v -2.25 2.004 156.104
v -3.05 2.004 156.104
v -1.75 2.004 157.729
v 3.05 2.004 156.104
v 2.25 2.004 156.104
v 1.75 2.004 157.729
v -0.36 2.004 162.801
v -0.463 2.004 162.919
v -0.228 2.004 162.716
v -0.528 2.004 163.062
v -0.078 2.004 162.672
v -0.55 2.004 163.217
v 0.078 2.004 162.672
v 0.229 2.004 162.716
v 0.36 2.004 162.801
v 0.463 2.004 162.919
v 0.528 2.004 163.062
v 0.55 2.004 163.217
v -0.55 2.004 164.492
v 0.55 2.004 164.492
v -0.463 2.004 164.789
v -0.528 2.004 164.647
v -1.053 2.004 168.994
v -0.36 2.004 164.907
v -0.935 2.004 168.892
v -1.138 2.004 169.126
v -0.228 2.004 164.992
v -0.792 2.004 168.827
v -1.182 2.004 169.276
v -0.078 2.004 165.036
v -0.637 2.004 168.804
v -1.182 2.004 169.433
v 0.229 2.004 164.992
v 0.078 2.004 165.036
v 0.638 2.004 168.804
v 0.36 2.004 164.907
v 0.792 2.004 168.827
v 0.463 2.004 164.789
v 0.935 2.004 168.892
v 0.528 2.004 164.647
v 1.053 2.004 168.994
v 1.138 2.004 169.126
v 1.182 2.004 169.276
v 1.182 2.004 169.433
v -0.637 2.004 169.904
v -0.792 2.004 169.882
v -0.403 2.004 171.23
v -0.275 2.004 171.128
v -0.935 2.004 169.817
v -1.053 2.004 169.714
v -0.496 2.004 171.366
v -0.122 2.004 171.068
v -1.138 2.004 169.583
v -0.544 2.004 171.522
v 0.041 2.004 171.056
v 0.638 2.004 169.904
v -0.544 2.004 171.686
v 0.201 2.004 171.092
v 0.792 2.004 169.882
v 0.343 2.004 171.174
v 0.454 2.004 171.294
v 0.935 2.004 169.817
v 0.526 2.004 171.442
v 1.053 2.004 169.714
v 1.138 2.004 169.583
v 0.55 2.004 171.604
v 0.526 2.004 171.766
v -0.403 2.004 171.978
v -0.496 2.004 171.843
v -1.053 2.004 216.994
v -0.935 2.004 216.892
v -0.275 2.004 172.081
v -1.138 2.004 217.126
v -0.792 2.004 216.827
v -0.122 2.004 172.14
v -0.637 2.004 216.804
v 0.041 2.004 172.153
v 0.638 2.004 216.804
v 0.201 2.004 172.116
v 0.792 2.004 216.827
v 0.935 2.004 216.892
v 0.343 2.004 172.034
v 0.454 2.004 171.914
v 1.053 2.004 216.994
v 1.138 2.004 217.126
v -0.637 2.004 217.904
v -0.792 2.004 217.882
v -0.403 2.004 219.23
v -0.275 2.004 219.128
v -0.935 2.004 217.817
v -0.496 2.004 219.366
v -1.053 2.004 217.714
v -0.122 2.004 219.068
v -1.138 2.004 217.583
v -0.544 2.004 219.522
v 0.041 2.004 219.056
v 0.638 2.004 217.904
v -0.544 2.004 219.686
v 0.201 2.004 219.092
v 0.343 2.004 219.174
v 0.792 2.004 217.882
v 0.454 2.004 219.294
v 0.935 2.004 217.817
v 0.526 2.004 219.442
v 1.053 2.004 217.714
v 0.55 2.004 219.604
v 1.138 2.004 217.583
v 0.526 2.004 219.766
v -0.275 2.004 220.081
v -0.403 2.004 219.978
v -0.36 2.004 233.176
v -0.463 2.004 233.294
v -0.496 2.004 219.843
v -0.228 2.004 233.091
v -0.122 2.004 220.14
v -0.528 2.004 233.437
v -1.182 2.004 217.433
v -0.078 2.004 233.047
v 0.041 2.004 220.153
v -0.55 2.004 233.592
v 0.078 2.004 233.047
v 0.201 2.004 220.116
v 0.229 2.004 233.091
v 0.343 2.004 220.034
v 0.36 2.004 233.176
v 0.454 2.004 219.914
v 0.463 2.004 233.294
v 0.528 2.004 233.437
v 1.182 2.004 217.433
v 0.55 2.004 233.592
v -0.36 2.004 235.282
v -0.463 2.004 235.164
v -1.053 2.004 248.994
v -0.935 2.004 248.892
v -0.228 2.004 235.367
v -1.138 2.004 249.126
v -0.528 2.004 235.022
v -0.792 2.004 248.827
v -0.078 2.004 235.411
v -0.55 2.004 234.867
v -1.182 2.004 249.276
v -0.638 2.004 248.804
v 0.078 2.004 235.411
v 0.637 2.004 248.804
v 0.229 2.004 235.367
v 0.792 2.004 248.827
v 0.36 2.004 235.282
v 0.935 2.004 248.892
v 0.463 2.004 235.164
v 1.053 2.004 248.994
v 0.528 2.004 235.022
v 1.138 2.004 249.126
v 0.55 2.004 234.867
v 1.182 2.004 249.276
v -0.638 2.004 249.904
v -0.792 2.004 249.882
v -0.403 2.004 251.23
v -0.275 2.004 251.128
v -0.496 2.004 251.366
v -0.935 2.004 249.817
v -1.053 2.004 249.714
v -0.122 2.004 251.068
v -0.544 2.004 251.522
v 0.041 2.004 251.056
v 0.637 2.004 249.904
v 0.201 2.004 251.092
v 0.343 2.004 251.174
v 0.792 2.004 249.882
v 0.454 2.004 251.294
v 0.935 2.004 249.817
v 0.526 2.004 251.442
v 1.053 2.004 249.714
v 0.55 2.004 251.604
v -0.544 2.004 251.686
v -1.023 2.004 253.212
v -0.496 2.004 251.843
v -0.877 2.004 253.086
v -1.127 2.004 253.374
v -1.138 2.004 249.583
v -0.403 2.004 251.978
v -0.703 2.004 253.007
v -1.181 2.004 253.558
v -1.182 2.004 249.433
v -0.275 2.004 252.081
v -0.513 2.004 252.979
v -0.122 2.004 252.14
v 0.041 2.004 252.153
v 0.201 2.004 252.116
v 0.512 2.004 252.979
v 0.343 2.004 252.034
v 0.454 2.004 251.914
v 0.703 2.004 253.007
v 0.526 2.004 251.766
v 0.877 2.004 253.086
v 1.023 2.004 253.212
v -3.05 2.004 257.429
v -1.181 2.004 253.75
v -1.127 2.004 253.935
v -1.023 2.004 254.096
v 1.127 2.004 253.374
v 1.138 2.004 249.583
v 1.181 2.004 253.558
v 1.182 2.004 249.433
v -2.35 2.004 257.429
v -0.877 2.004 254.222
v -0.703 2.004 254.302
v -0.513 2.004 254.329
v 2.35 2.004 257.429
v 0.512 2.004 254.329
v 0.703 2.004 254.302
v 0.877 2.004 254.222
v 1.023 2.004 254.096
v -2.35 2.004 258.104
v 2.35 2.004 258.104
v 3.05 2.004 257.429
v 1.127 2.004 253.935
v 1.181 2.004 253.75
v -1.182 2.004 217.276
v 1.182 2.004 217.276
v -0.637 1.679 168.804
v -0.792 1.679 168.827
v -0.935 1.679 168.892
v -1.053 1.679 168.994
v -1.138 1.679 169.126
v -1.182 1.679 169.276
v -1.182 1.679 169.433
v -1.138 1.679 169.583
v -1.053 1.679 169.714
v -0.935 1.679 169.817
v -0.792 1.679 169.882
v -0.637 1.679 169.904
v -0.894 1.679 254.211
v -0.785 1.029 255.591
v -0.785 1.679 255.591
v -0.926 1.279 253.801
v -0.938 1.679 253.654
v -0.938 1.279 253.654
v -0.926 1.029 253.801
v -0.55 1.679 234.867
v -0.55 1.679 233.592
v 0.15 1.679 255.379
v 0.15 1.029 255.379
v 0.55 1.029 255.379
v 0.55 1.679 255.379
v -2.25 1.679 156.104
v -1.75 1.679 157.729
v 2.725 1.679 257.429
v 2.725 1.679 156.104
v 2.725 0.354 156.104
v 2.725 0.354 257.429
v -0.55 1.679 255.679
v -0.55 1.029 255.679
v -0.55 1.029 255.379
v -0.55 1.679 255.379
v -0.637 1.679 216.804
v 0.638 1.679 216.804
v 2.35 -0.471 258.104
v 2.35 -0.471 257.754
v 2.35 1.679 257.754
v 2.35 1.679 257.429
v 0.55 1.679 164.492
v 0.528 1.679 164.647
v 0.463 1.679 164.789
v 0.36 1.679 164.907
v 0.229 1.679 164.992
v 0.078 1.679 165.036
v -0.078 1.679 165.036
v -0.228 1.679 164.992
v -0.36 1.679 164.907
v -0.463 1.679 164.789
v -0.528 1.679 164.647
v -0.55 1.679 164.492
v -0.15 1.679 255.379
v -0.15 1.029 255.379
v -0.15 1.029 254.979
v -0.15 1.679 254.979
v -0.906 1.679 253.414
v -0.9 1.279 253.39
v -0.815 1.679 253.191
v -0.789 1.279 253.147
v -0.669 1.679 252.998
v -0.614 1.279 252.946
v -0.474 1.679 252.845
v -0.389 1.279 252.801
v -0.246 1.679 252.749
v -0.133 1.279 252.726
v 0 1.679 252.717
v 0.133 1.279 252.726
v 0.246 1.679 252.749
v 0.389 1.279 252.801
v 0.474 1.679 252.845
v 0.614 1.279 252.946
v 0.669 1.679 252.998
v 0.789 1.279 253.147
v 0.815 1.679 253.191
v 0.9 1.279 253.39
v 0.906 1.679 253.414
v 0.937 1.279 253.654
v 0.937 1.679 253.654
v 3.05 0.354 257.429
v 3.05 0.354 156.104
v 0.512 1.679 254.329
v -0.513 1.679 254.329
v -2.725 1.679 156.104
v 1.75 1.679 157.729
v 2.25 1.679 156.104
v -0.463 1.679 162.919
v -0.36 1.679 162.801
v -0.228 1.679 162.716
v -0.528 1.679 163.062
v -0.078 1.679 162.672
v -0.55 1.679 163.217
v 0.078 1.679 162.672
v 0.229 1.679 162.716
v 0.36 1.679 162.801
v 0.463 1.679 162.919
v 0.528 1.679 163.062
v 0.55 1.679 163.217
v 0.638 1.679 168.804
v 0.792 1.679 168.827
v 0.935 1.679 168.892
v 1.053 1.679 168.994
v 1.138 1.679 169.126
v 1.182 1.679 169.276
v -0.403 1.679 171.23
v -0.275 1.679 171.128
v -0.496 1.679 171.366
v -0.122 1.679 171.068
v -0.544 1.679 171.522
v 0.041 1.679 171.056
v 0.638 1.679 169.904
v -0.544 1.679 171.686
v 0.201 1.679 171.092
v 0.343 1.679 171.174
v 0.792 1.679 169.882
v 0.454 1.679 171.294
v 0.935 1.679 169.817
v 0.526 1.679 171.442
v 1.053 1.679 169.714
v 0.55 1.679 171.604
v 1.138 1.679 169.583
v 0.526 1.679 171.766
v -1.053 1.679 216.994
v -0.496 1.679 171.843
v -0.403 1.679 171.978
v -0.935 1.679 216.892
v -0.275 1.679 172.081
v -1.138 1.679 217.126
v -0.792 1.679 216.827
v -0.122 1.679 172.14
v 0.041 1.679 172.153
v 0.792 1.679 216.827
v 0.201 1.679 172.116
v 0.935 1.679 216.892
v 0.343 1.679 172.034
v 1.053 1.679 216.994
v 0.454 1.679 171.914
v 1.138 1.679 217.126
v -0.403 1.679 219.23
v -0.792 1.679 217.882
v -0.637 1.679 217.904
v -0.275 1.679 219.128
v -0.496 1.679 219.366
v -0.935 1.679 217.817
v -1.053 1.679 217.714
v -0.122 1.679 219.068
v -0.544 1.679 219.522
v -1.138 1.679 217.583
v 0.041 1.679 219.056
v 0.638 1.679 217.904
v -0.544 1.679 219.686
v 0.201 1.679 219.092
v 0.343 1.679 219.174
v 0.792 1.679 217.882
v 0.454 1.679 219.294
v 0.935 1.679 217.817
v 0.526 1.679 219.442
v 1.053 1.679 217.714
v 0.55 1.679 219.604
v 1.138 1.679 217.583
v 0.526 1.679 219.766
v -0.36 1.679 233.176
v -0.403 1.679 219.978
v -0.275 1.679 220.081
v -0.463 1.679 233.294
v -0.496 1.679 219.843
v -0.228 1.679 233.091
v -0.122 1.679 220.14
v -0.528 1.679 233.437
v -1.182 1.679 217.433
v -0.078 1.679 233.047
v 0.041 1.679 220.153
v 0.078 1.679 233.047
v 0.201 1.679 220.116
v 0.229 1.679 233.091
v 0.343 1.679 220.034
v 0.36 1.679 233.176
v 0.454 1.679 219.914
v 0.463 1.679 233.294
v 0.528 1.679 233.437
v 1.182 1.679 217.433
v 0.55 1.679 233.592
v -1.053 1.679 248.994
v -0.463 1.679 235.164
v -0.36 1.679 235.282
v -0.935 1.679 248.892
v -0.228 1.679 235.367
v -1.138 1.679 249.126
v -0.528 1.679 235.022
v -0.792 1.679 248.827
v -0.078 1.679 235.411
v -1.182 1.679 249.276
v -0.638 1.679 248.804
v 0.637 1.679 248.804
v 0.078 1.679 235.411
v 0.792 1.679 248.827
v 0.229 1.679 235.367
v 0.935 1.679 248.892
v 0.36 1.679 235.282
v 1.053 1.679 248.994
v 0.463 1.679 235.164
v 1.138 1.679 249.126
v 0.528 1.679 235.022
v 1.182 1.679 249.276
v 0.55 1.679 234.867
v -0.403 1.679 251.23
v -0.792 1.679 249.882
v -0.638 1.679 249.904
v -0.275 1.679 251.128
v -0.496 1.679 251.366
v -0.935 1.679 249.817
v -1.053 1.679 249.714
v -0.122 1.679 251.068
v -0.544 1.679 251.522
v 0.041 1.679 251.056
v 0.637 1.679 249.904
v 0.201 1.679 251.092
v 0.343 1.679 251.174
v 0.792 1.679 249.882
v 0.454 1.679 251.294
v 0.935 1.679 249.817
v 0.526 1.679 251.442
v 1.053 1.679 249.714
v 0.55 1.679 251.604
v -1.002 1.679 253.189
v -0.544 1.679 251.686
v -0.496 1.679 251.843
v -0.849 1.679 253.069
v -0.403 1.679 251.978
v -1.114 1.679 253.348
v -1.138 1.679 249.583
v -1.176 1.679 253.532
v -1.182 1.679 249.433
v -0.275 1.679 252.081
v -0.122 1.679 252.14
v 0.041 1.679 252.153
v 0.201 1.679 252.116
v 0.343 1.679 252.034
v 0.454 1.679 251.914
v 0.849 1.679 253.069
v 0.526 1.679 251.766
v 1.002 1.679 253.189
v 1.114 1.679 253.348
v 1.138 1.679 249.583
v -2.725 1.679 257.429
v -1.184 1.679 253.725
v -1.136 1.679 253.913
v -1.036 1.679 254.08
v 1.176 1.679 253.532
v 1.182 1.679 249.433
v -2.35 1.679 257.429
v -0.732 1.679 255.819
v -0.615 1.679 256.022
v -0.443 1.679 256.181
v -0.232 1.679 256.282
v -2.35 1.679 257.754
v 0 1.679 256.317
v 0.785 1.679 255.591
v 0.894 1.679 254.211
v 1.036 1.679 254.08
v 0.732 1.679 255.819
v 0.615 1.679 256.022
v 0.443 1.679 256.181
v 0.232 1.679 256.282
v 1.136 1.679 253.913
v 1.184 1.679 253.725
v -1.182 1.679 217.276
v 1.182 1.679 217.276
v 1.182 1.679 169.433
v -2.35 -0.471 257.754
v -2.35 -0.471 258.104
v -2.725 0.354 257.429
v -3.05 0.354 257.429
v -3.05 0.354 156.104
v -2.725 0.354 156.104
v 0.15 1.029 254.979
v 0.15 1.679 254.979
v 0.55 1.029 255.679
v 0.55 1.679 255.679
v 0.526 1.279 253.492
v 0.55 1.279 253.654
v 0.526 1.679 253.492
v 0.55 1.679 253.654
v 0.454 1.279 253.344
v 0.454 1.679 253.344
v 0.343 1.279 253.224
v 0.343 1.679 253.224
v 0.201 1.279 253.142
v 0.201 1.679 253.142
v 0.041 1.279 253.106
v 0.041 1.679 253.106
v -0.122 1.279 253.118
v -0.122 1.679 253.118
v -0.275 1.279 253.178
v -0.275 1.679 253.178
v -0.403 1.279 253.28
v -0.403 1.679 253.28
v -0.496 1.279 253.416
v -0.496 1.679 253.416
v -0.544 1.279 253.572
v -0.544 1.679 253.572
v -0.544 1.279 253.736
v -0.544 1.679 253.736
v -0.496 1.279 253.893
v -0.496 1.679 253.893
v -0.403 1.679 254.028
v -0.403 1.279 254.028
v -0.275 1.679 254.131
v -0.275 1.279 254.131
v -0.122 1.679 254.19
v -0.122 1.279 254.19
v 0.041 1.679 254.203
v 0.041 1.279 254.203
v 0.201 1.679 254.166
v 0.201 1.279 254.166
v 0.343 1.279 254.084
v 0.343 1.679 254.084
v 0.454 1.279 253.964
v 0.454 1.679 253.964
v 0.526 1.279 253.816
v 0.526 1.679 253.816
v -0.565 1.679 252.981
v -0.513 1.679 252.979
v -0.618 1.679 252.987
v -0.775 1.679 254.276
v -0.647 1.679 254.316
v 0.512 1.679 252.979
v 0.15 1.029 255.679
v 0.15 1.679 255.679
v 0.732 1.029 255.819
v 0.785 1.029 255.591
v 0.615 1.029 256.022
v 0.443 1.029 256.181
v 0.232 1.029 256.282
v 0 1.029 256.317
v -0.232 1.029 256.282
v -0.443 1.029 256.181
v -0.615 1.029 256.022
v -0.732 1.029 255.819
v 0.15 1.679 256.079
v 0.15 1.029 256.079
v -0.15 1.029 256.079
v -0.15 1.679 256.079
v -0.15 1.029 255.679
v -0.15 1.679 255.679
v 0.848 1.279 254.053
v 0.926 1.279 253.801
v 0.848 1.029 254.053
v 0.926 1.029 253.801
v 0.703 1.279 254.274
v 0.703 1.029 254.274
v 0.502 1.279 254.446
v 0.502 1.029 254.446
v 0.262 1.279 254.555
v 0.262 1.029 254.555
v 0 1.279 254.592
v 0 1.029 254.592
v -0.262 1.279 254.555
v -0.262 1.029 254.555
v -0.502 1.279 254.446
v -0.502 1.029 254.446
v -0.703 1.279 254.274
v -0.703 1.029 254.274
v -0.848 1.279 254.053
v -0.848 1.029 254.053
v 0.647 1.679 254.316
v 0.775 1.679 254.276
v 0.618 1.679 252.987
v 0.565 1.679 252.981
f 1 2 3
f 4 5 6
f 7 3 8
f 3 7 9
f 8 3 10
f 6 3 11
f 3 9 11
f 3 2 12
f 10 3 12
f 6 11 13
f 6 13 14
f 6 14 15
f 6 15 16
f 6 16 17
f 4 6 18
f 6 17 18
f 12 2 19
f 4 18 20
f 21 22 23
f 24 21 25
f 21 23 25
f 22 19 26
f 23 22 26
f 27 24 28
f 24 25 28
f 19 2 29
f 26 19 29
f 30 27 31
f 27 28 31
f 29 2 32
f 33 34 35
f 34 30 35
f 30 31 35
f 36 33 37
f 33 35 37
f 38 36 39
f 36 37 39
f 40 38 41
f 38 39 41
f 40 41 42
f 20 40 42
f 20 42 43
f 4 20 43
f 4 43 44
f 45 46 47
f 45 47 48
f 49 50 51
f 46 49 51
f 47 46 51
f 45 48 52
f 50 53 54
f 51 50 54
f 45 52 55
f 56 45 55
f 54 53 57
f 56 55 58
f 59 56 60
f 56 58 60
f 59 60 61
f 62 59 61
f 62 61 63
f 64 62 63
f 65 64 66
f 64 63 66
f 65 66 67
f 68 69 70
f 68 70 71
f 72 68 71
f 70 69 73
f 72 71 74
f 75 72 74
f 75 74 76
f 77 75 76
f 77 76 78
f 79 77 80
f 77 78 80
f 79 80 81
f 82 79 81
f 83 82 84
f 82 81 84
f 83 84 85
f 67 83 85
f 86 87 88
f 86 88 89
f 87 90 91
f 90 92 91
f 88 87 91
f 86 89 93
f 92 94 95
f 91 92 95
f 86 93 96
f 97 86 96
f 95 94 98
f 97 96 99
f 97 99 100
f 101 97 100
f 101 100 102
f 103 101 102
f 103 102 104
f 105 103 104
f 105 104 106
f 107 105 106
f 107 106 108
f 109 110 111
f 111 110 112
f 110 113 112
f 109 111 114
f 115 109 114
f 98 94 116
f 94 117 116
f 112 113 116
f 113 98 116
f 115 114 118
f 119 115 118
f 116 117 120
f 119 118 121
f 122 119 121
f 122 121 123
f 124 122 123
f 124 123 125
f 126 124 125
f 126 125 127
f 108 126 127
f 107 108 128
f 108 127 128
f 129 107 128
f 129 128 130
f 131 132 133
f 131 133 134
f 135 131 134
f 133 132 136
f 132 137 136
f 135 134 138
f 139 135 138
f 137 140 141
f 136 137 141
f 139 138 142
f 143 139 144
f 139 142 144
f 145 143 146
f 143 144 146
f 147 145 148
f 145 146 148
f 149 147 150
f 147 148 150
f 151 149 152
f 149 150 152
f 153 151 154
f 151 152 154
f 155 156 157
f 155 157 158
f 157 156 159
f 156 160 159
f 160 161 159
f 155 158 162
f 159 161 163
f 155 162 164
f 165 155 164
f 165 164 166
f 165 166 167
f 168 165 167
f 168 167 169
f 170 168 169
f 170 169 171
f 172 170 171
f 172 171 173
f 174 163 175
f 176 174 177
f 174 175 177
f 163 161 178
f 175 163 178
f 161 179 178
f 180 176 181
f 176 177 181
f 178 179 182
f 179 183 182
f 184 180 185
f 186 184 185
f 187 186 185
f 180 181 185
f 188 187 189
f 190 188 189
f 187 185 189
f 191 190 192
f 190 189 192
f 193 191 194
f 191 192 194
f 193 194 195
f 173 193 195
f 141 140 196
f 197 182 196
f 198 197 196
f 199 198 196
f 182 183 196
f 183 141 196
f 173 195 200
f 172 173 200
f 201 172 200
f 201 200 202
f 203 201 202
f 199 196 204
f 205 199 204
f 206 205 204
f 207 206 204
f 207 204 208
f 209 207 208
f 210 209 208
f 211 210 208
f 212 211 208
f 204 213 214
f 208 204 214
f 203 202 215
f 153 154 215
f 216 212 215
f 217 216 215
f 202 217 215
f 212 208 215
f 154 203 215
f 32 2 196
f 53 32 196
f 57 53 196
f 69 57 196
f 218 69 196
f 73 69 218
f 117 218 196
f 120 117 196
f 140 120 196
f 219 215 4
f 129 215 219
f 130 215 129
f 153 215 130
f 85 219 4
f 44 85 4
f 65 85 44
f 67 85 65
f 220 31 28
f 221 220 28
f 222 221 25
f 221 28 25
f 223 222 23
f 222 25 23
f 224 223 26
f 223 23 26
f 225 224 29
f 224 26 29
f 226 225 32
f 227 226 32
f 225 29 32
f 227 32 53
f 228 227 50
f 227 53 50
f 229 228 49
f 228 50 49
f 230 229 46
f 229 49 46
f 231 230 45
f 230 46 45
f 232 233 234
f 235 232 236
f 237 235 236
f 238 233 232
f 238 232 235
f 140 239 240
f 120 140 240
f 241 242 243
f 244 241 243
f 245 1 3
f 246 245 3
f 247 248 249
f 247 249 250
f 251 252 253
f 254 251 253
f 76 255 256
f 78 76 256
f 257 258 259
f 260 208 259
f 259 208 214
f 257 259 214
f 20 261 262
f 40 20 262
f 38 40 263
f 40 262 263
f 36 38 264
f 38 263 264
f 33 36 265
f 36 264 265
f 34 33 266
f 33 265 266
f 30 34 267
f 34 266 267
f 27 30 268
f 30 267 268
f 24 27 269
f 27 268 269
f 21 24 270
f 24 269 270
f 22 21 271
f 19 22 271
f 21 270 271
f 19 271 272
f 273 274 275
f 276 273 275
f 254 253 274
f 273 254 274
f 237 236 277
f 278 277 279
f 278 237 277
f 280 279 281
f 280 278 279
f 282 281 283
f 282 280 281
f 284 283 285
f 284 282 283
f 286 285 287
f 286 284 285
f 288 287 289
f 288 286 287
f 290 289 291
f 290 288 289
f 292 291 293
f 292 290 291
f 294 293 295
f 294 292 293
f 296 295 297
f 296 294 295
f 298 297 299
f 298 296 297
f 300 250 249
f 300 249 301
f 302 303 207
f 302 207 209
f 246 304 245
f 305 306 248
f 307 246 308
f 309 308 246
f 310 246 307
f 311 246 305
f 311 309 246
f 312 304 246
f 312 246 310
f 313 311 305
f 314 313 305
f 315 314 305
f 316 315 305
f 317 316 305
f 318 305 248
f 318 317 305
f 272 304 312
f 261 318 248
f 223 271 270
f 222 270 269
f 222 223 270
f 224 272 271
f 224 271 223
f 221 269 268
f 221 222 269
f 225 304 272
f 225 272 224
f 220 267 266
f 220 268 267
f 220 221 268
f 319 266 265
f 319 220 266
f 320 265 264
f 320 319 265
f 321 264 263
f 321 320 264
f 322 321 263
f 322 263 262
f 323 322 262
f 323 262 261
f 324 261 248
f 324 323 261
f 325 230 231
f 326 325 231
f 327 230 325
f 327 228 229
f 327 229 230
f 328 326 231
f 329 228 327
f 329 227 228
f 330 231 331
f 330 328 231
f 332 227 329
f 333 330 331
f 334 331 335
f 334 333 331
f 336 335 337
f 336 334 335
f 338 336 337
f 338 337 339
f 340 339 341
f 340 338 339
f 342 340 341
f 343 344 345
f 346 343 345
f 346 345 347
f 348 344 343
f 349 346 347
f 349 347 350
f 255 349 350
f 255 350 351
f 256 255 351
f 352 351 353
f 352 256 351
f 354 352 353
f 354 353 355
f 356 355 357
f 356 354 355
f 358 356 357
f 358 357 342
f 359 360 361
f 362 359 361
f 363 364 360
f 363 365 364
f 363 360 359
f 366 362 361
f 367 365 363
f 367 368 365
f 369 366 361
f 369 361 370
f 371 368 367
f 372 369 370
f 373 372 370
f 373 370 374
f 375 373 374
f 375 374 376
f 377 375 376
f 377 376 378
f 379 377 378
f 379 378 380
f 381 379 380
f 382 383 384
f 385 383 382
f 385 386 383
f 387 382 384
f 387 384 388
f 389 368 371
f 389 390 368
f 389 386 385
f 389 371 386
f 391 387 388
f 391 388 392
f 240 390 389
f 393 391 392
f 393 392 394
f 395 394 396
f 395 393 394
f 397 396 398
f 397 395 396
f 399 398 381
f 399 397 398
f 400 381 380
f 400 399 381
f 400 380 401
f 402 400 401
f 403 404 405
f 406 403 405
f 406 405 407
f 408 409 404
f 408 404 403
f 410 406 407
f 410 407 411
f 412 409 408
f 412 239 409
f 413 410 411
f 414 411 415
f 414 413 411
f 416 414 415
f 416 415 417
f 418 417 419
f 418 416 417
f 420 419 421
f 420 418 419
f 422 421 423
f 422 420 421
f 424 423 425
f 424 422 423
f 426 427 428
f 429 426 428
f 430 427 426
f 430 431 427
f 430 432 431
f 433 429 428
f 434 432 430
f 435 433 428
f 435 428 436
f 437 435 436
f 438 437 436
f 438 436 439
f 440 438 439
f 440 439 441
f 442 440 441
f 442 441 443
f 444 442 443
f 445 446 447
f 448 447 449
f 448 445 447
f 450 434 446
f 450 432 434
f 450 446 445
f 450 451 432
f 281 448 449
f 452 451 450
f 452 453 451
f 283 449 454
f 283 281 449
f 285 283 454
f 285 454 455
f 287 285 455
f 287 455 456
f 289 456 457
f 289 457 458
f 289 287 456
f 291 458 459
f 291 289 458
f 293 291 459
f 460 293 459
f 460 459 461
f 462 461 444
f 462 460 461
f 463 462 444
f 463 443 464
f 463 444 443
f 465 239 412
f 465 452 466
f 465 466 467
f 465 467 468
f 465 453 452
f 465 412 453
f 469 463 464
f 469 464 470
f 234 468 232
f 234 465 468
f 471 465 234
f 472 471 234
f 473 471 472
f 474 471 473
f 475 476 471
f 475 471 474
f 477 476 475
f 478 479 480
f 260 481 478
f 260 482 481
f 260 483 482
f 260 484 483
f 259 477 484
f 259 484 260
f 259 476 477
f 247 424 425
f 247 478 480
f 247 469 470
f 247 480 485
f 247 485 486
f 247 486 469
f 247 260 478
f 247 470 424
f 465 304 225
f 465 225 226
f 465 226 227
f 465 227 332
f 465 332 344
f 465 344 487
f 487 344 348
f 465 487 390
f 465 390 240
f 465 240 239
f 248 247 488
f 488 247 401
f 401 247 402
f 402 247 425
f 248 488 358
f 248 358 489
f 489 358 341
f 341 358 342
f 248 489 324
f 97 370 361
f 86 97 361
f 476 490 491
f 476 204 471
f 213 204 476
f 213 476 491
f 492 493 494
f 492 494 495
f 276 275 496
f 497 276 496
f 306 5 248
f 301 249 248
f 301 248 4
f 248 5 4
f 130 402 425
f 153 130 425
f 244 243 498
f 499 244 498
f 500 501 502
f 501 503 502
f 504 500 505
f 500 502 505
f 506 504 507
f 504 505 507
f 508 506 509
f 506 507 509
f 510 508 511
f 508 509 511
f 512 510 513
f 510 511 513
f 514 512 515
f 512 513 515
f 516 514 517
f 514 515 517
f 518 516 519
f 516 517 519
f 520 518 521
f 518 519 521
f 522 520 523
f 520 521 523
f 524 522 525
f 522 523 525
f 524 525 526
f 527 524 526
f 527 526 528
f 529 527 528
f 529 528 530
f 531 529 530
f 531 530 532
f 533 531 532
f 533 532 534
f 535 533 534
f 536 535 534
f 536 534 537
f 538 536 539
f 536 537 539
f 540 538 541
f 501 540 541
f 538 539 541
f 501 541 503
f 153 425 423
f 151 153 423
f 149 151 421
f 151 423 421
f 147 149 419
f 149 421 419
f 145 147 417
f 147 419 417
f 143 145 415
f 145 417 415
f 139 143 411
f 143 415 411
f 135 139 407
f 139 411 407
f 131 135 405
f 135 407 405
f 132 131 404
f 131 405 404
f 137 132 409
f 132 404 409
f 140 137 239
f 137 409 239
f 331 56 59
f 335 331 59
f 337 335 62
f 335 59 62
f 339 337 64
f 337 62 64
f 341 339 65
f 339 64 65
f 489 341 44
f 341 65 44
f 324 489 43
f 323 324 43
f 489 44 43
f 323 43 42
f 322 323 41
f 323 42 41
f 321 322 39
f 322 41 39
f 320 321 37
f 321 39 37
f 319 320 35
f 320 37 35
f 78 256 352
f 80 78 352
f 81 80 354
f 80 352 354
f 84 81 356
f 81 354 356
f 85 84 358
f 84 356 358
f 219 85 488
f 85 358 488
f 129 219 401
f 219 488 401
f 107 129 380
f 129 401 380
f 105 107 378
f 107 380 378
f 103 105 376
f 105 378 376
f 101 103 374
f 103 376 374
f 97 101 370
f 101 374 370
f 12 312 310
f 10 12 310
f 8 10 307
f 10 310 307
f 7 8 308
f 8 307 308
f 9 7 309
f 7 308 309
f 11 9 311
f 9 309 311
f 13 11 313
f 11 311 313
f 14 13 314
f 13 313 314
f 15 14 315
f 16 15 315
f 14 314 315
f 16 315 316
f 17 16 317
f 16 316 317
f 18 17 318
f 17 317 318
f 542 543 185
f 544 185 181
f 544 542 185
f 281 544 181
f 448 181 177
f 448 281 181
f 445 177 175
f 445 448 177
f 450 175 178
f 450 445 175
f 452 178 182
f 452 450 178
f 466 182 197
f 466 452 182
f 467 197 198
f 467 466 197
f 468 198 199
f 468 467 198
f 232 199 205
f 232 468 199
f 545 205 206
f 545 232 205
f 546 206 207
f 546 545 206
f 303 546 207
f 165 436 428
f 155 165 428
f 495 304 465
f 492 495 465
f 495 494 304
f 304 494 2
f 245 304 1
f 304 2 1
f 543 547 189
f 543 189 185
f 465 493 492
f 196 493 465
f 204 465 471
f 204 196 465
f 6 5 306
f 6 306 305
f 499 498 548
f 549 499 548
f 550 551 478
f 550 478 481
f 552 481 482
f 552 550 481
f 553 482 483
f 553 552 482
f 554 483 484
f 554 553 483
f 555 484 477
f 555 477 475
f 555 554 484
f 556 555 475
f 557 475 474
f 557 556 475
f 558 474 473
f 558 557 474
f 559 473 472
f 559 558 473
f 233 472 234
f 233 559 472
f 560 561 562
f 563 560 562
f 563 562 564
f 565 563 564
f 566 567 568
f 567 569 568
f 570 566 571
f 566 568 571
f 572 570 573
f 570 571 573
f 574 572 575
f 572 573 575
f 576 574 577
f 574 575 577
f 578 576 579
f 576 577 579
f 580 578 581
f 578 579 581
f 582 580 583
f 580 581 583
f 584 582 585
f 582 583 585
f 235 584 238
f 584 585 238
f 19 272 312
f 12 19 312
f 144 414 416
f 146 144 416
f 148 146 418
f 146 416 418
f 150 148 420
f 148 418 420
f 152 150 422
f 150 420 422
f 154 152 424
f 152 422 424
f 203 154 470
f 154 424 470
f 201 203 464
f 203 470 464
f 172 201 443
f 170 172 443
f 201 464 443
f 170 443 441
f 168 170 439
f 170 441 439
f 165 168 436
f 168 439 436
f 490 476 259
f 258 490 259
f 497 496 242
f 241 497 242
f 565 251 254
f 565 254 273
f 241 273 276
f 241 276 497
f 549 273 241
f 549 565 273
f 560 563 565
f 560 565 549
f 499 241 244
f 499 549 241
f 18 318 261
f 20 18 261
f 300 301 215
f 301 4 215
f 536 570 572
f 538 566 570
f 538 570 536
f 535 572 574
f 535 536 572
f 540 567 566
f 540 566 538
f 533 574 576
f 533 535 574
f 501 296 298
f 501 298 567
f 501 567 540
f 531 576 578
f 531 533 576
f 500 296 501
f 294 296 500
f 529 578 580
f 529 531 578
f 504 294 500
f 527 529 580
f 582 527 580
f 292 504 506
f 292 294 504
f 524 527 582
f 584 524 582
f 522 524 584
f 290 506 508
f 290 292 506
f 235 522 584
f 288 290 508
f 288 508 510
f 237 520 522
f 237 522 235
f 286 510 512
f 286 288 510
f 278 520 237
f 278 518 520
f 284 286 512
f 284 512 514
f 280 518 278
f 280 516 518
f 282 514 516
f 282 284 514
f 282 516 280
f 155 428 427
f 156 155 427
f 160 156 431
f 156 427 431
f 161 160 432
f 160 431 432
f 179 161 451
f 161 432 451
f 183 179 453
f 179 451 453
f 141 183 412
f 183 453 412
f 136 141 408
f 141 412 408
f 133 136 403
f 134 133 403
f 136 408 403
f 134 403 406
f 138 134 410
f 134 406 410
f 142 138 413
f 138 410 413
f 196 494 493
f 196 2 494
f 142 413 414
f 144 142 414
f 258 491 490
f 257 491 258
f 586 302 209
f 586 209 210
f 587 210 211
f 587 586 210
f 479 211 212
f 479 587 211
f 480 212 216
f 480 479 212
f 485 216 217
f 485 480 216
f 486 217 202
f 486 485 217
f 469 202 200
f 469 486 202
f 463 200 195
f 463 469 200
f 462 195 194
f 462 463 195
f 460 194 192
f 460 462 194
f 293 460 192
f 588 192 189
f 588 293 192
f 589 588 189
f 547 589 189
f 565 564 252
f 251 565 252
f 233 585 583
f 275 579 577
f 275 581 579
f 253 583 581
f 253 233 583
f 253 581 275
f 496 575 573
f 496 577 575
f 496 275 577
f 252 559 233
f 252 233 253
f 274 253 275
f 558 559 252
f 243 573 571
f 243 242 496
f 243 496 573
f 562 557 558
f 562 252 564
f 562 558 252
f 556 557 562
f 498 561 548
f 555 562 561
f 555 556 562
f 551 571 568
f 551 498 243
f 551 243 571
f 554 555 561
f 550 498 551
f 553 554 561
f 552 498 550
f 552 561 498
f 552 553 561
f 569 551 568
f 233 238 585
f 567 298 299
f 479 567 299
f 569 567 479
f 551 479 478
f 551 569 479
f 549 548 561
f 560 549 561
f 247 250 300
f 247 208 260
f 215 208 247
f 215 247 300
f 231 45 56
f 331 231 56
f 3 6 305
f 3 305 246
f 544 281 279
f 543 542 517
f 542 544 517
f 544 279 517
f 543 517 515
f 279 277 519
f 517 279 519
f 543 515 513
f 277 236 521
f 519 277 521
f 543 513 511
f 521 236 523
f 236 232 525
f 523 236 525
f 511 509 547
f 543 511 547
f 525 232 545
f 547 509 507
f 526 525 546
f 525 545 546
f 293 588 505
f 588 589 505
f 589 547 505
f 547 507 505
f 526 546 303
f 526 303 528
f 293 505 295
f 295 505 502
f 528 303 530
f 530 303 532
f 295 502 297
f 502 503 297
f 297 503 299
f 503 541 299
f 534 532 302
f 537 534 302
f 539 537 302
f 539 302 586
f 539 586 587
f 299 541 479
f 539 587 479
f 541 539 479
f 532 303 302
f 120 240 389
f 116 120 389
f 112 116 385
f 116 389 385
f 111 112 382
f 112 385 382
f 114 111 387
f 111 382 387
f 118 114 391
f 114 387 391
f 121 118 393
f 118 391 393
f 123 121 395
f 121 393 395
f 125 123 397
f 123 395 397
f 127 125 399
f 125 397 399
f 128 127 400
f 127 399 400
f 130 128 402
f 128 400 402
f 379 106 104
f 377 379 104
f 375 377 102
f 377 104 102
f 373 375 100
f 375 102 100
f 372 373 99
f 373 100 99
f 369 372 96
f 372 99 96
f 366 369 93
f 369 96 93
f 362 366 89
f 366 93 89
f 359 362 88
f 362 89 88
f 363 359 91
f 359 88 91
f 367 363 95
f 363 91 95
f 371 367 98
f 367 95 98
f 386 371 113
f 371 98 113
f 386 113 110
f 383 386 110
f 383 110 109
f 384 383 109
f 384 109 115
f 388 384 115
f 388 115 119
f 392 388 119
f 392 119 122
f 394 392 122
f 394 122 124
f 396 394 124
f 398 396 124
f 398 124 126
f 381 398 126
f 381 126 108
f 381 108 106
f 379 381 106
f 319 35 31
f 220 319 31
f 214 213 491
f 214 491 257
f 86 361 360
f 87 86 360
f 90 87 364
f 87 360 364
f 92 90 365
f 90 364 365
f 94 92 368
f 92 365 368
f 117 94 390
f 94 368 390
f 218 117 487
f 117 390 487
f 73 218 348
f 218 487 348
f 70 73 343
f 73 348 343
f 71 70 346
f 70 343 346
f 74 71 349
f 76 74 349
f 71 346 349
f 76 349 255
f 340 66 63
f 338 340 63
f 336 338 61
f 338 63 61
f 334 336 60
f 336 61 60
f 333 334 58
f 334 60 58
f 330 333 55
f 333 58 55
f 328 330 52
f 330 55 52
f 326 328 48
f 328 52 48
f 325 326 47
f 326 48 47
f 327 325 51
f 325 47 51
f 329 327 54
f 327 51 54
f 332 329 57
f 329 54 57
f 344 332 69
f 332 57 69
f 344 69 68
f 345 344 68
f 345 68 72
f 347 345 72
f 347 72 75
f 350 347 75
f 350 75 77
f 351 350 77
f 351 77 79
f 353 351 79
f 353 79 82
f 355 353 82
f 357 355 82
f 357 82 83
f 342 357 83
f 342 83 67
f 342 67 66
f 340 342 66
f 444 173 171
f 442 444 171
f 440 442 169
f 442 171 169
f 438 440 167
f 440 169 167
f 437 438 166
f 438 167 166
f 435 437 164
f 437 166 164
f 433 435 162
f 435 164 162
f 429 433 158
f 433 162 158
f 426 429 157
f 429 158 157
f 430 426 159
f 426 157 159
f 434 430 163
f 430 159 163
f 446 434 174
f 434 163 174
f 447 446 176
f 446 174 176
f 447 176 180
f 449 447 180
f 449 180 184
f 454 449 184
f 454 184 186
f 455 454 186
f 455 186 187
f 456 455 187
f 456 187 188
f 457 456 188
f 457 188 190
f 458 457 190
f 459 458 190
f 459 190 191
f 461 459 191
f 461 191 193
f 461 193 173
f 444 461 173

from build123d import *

# Parameters (mm, degrees)
BOSS_EXTRUDE1_DEPTH                              = 2.6
SKETCH2_W                                        = 24.4
SKETCH2_H                                        = 408
BOSS_EXTRUDE2_DEPTH                              = 1.3
SKETCH3_W                                        = 2.8
SKETCH3_H                                        = 2.7
CUT_EXTRUDE1_DEPTH                               = 4.9
SKETCH4_W                                        = 1.3
SKETCH4_H                                        = 405.3
BOSS_EXTRUDE3_DEPTH                              = 5.3
SKETCH5_W                                        = 2.8
SKETCH5_H                                        = 2.7
CUT_EXTRUDE2_DEPTH                               = 7.6
SKETCH6_W                                        = 1.3
SKETCH6_H                                        = 405.3
BOSS_EXTRUDE4_DEPTH                              = 5.3
SKETCH7_W                                        = 18.8
SKETCH7_H                                        = 1.4
BOSS_EXTRUDE5_DEPTH                              = 8.6
SKETCH8_W                                        = 14
SKETCH8_H                                        = 6.5
CUT_EXTRUDE3_DEPTH                               = 10.9
CUT_EXTRUDE4_DEPTH                               = 2.3
CUT_EXTRUDE5_DEPTH                               = 2.3
CUT_EXTRUDE6_DEPTH                               = 2.3
CUT_EXTRUDE7_DEPTH                               = 2.3
CUT_EXTRUDE8_DEPTH                               = 10.9
CUT_EXTRUDE9_DEPTH                               = 2.6
DRAFT1_ANGLE                                     = 17.102728969
F_4_4_4_4_DIAMETER_HOLE1_D                       = 4.4
F_4_4_4_4_DIAMETER_HOLE1_DEPTH                   = 1.3
CBORE_FOR_M4_HEX_HEAD_MACHINE_SCREW1_D           = 4.4
CBORE_FOR_M4_HEX_HEAD_MACHINE_SCREW1_DEPTH       = 3.9
CBORE_FOR_M4_HEX_HEAD_MACHINE_SCREW1_CBORE_D     = 7.5
CBORE_FOR_M4_HEX_HEAD_MACHINE_SCREW1_CBORE_DEPTH = 1
SCALE1_SCALE                                     = 0.25


with BuildPart() as part:
    # Sketch1 → Boss-Extrude1 (new body)
    with BuildSketch(Plane.XZ.offset(0.6)):
        with BuildLine():
            Line((3.75, 390.2), (3.140289704, 397.947144852))
            ThreePointArc((3.140289704, 397.947144852), (0, 400.85), (-3.140289704, 397.947144852))
            Line((-3.140289704, 397.947144852), (-3.75, 390.2))
            ThreePointArc((-3.75, 390.2), (0, 386.45), (3.75, 390.2))
        make_face()
    extrude(amount=-BOSS_EXTRUDE1_DEPTH)

    # Sketch2 → Boss-Extrude2 (add)
    with BuildSketch(Plane.XZ.offset(-2)):
        with Locations((0, 204)):
            Rectangle(SKETCH2_W, SKETCH2_H)
        with BuildLine():
            Line((-2.05, 392.9), (2.05, 392.9))
            ThreePointArc((2.05, 392.9), (4.75, 390.2), (2.05, 387.5))
            Line((2.05, 387.5), (-2.05, 387.5))
            ThreePointArc((-2.05, 387.5), (-4.75, 390.2), (-2.05, 392.9))
        make_face(mode=Mode.SUBTRACT)
    extrude(amount=-BOSS_EXTRUDE2_DEPTH)

    # Sketch3 → Cut-Extrude1 (cut, through all)
    with BuildSketch(Plane(origin=(0, 3.3, 0), x_dir=(-1, 0, 0), z_dir=(0, 1, 0))):
        with Locations((-10.8, 406.65)):
            Rectangle(SKETCH3_W, SKETCH3_H)
    extrude(amount=-CUT_EXTRUDE1_DEPTH, mode=Mode.SUBTRACT)

    # Sketch4 → Boss-Extrude3 (add)
    with BuildSketch(Plane.XZ.offset(-2)):
        with Locations((11.55, 202.65)):
            Rectangle(SKETCH4_W, SKETCH4_H)
    extrude(amount=BOSS_EXTRUDE3_DEPTH)

    # Sketch5 → Cut-Extrude2 (cut, through all)
    with BuildSketch(Plane(origin=(0, 3.3, 0), x_dir=(-1, 0, 0), z_dir=(0, 1, 0))):
        with Locations((10.8, 406.65)):
            Rectangle(SKETCH5_W, SKETCH5_H)
    extrude(amount=-CUT_EXTRUDE2_DEPTH, mode=Mode.SUBTRACT)

    # Sketch6 → Boss-Extrude4 (add)
    with BuildSketch(Plane.XZ.offset(-2)):
        with Locations((-11.55, 202.65)):
            Rectangle(SKETCH6_W, SKETCH6_H)
    extrude(amount=BOSS_EXTRUDE4_DEPTH)

    # Sketch7 → Boss-Extrude5 (add)
    with BuildSketch(Plane.XZ.offset(-2)):
        with Locations((0, 407.3)):
            Rectangle(SKETCH7_W, SKETCH7_H)
    extrude(amount=BOSS_EXTRUDE5_DEPTH)

    # Sketch8 → Cut-Extrude3 (cut, through all)
    with BuildSketch(Plane(origin=(0, 3.3, 0), x_dir=(-1, 0, 0), z_dir=(0, 1, 0))):
        with Locations((0, 3.25)):
            Rectangle(SKETCH8_W, SKETCH8_H)
    extrude(amount=-CUT_EXTRUDE3_DEPTH, mode=Mode.SUBTRACT)

    # Sketch9 → Cut-Extrude4 (cut, through all)
    with BuildSketch(Plane.XZ.offset(-2)):
        with BuildLine():
            Line((2.55, 375.200000014), (-2.55, 375.200000014))
            ThreePointArc((-2.55, 375.200000014), (-4.75, 373.000000014), (-2.55, 370.800000014))
            Line((-2.55, 370.800000014), (2.55, 370.800000014))
            ThreePointArc((2.55, 370.800000014), (4.75, 373.000000014), (2.55, 375.200000014))
        make_face()
    extrude(amount=-CUT_EXTRUDE4_DEPTH, mode=Mode.SUBTRACT)

    # Sketch10 → Cut-Extrude5 (cut, through all)
    with BuildSketch(Plane.XZ.offset(-2)):
        with BuildLine():
            Line((-2.549860329, 242.799983225), (2.550139671, 242.8))
            ThreePointArc((2.550139671, 242.8), (4.750132435, 245.000007236), (2.550125198, 247.2))
            Line((2.550125198, 247.2), (-2.549874802, 247.199983225))
            ThreePointArc((-2.549874802, 247.199983225), (-4.749867565, 244.999975989), (-2.549860329, 242.799983225))
        make_face()
    extrude(amount=-CUT_EXTRUDE5_DEPTH, mode=Mode.SUBTRACT)

    # Sketch11 → Cut-Extrude6 (cut, through all)
    with BuildSketch(Plane.XZ.offset(-2)):
        with BuildLine():
            Line((2.200125198, 309.95), (2.200125198, 315.05))
            ThreePointArc((2.200125198, 315.05), (0.000125198, 317.25), (-2.199874802, 315.05))
            Line((-2.199874802, 315.05), (-2.199874802, 309.95))
            ThreePointArc((-2.199874802, 309.95), (0.000125198, 307.75), (2.200125198, 309.95))
        make_face()
    extrude(amount=-CUT_EXTRUDE6_DEPTH, mode=Mode.SUBTRACT)

    # Sketch12 → Cut-Extrude7 (cut, through all)
    with BuildSketch(Plane.XZ.offset(-2)):
        with BuildLine():
            Line((2.200125198, 28.45), (2.200125198, 33.55))
            ThreePointArc((2.200125198, 33.55), (0.000125198, 35.75), (-2.199874802, 33.55))
            Line((-2.199874802, 33.55), (-2.199874802, 28.45))
            ThreePointArc((-2.199874802, 28.45), (0.000125198, 26.25), (2.200125198, 28.45))
        make_face()
    extrude(amount=-CUT_EXTRUDE7_DEPTH, mode=Mode.SUBTRACT)

    # Sketch13 → Cut-Extrude8 (cut, through all)
    with BuildSketch(Plane(origin=(0, 3.3, 0), x_dir=(-1, 0, 0), z_dir=(0, 1, 0))):
        with BuildLine():
            Line((2.549874802, 55.2), (-2.550125198, 55.2))
            ThreePointArc((-2.550125198, 55.2), (-4.750125198, 53), (-2.550125198, 50.8))
            Line((-2.550125198, 50.8), (2.549874802, 50.8))
            ThreePointArc((2.549874802, 50.8), (4.749874802, 53), (2.549874802, 55.2))
        make_face()
    extrude(amount=-CUT_EXTRUDE8_DEPTH, mode=Mode.SUBTRACT)

    # Sketch14 → Cut-Extrude9 (cut)
    with BuildSketch(Plane.XZ.offset(0.6)):
        Polygon((0.6, 397.1), (2.2, 397.1), (2.2, 398.3), (0.6, 398.3), (0.6, 399.9), (-0.6, 399.9), (-0.6, 398.3), (-2.2, 398.3), (-2.2, 397.1), (-0.6, 397.1), (-0.6, 395.5), (0.6, 395.5), align=None)
    extrude(amount=-CUT_EXTRUDE9_DEPTH, mode=Mode.SUBTRACT)

    # Draft1
    draft1_faces = [part.faces().sort_by_distance(p)[0] for p in [
        (-7, 2.65, 3.25),
        (7, 2.65, 3.25),
    ]]
    draft(draft1_faces, Plane(origin=(-7, -6.6, 6.5), x_dir=(0, -1, 0), z_dir=(0, 0, -1)), DRAFT1_ANGLE)

    # Ø4.4 (4.4) Diameter Hole1
    with Locations(Plane(origin=(0, 2, 0), x_dir=(-1, 0, 0), z_dir=(0, -1, 0))):
        with Locations((-0.000125198, -62), (-0.000125198, -254), (0, -382)):
            Hole(F_4_4_4_4_DIAMETER_HOLE1_D / 2, depth=F_4_4_4_4_DIAMETER_HOLE1_DEPTH)

    # CBORE for M4 Hex Head Machine Screw1
    with Locations(Plane(origin=(0, -0.6, 0), x_dir=(-1, 0, 0), z_dir=(0, -1, 0))):
        with Locations((0, -390.2)):
            CounterBoreHole(CBORE_FOR_M4_HEX_HEAD_MACHINE_SCREW1_D / 2, CBORE_FOR_M4_HEX_HEAD_MACHINE_SCREW1_CBORE_D / 2, CBORE_FOR_M4_HEX_HEAD_MACHINE_SCREW1_CBORE_DEPTH, depth=CBORE_FOR_M4_HEX_HEAD_MACHINE_SCREW1_DEPTH)


with BuildPart() as part_1:
    # Scale1: scaled about (-1.622e-06, 1.572421019, 208.139009322)
    add(part.part.scale(SCALE1_SCALE).moved(Location((-1.217e-06, 1.179315764, 156.104256991))))


solid = part_1.part
